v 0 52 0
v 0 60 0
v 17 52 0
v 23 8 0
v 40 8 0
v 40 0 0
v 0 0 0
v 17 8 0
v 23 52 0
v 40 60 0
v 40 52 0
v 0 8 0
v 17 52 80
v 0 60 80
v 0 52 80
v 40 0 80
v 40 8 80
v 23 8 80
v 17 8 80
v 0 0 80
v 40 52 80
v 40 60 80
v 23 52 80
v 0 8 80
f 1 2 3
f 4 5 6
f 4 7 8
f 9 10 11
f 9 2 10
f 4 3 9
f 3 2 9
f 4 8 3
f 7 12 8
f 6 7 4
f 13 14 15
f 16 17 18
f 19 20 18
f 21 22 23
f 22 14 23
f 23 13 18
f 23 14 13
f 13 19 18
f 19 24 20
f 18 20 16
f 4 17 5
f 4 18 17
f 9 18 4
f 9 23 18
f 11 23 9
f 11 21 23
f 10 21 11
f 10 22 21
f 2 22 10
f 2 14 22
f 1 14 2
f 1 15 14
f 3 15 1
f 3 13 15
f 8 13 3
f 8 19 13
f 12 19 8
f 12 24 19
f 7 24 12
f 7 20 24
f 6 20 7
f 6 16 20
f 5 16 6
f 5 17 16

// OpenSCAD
$fn = 32;

// ----------------------------------------------------------------------
// Structural section: ibeam 40 x 60 mm
// ----------------------------------------------------------------------

// --- parameters (mm) ---
sec_w = 40;               // section width, X
sec_h = 60;               // section height, Y
flange_t = 8;             // flange thickness
web_t = 6;                // web thickness
plate_t = 80;             // cut length, Z (extrusion height)

profile = [[0, 0], [40, 0], [40, 8], [23, 8], [23, 52], [40, 52], [40, 60], [0, 60], [0, 52], [17, 52], [17, 8], [0, 8]];  // primary outline, 12 points, counter clockwise

// --- the one profile operation ---
linear_extrude(height = plate_t) polygon(points = profile);
